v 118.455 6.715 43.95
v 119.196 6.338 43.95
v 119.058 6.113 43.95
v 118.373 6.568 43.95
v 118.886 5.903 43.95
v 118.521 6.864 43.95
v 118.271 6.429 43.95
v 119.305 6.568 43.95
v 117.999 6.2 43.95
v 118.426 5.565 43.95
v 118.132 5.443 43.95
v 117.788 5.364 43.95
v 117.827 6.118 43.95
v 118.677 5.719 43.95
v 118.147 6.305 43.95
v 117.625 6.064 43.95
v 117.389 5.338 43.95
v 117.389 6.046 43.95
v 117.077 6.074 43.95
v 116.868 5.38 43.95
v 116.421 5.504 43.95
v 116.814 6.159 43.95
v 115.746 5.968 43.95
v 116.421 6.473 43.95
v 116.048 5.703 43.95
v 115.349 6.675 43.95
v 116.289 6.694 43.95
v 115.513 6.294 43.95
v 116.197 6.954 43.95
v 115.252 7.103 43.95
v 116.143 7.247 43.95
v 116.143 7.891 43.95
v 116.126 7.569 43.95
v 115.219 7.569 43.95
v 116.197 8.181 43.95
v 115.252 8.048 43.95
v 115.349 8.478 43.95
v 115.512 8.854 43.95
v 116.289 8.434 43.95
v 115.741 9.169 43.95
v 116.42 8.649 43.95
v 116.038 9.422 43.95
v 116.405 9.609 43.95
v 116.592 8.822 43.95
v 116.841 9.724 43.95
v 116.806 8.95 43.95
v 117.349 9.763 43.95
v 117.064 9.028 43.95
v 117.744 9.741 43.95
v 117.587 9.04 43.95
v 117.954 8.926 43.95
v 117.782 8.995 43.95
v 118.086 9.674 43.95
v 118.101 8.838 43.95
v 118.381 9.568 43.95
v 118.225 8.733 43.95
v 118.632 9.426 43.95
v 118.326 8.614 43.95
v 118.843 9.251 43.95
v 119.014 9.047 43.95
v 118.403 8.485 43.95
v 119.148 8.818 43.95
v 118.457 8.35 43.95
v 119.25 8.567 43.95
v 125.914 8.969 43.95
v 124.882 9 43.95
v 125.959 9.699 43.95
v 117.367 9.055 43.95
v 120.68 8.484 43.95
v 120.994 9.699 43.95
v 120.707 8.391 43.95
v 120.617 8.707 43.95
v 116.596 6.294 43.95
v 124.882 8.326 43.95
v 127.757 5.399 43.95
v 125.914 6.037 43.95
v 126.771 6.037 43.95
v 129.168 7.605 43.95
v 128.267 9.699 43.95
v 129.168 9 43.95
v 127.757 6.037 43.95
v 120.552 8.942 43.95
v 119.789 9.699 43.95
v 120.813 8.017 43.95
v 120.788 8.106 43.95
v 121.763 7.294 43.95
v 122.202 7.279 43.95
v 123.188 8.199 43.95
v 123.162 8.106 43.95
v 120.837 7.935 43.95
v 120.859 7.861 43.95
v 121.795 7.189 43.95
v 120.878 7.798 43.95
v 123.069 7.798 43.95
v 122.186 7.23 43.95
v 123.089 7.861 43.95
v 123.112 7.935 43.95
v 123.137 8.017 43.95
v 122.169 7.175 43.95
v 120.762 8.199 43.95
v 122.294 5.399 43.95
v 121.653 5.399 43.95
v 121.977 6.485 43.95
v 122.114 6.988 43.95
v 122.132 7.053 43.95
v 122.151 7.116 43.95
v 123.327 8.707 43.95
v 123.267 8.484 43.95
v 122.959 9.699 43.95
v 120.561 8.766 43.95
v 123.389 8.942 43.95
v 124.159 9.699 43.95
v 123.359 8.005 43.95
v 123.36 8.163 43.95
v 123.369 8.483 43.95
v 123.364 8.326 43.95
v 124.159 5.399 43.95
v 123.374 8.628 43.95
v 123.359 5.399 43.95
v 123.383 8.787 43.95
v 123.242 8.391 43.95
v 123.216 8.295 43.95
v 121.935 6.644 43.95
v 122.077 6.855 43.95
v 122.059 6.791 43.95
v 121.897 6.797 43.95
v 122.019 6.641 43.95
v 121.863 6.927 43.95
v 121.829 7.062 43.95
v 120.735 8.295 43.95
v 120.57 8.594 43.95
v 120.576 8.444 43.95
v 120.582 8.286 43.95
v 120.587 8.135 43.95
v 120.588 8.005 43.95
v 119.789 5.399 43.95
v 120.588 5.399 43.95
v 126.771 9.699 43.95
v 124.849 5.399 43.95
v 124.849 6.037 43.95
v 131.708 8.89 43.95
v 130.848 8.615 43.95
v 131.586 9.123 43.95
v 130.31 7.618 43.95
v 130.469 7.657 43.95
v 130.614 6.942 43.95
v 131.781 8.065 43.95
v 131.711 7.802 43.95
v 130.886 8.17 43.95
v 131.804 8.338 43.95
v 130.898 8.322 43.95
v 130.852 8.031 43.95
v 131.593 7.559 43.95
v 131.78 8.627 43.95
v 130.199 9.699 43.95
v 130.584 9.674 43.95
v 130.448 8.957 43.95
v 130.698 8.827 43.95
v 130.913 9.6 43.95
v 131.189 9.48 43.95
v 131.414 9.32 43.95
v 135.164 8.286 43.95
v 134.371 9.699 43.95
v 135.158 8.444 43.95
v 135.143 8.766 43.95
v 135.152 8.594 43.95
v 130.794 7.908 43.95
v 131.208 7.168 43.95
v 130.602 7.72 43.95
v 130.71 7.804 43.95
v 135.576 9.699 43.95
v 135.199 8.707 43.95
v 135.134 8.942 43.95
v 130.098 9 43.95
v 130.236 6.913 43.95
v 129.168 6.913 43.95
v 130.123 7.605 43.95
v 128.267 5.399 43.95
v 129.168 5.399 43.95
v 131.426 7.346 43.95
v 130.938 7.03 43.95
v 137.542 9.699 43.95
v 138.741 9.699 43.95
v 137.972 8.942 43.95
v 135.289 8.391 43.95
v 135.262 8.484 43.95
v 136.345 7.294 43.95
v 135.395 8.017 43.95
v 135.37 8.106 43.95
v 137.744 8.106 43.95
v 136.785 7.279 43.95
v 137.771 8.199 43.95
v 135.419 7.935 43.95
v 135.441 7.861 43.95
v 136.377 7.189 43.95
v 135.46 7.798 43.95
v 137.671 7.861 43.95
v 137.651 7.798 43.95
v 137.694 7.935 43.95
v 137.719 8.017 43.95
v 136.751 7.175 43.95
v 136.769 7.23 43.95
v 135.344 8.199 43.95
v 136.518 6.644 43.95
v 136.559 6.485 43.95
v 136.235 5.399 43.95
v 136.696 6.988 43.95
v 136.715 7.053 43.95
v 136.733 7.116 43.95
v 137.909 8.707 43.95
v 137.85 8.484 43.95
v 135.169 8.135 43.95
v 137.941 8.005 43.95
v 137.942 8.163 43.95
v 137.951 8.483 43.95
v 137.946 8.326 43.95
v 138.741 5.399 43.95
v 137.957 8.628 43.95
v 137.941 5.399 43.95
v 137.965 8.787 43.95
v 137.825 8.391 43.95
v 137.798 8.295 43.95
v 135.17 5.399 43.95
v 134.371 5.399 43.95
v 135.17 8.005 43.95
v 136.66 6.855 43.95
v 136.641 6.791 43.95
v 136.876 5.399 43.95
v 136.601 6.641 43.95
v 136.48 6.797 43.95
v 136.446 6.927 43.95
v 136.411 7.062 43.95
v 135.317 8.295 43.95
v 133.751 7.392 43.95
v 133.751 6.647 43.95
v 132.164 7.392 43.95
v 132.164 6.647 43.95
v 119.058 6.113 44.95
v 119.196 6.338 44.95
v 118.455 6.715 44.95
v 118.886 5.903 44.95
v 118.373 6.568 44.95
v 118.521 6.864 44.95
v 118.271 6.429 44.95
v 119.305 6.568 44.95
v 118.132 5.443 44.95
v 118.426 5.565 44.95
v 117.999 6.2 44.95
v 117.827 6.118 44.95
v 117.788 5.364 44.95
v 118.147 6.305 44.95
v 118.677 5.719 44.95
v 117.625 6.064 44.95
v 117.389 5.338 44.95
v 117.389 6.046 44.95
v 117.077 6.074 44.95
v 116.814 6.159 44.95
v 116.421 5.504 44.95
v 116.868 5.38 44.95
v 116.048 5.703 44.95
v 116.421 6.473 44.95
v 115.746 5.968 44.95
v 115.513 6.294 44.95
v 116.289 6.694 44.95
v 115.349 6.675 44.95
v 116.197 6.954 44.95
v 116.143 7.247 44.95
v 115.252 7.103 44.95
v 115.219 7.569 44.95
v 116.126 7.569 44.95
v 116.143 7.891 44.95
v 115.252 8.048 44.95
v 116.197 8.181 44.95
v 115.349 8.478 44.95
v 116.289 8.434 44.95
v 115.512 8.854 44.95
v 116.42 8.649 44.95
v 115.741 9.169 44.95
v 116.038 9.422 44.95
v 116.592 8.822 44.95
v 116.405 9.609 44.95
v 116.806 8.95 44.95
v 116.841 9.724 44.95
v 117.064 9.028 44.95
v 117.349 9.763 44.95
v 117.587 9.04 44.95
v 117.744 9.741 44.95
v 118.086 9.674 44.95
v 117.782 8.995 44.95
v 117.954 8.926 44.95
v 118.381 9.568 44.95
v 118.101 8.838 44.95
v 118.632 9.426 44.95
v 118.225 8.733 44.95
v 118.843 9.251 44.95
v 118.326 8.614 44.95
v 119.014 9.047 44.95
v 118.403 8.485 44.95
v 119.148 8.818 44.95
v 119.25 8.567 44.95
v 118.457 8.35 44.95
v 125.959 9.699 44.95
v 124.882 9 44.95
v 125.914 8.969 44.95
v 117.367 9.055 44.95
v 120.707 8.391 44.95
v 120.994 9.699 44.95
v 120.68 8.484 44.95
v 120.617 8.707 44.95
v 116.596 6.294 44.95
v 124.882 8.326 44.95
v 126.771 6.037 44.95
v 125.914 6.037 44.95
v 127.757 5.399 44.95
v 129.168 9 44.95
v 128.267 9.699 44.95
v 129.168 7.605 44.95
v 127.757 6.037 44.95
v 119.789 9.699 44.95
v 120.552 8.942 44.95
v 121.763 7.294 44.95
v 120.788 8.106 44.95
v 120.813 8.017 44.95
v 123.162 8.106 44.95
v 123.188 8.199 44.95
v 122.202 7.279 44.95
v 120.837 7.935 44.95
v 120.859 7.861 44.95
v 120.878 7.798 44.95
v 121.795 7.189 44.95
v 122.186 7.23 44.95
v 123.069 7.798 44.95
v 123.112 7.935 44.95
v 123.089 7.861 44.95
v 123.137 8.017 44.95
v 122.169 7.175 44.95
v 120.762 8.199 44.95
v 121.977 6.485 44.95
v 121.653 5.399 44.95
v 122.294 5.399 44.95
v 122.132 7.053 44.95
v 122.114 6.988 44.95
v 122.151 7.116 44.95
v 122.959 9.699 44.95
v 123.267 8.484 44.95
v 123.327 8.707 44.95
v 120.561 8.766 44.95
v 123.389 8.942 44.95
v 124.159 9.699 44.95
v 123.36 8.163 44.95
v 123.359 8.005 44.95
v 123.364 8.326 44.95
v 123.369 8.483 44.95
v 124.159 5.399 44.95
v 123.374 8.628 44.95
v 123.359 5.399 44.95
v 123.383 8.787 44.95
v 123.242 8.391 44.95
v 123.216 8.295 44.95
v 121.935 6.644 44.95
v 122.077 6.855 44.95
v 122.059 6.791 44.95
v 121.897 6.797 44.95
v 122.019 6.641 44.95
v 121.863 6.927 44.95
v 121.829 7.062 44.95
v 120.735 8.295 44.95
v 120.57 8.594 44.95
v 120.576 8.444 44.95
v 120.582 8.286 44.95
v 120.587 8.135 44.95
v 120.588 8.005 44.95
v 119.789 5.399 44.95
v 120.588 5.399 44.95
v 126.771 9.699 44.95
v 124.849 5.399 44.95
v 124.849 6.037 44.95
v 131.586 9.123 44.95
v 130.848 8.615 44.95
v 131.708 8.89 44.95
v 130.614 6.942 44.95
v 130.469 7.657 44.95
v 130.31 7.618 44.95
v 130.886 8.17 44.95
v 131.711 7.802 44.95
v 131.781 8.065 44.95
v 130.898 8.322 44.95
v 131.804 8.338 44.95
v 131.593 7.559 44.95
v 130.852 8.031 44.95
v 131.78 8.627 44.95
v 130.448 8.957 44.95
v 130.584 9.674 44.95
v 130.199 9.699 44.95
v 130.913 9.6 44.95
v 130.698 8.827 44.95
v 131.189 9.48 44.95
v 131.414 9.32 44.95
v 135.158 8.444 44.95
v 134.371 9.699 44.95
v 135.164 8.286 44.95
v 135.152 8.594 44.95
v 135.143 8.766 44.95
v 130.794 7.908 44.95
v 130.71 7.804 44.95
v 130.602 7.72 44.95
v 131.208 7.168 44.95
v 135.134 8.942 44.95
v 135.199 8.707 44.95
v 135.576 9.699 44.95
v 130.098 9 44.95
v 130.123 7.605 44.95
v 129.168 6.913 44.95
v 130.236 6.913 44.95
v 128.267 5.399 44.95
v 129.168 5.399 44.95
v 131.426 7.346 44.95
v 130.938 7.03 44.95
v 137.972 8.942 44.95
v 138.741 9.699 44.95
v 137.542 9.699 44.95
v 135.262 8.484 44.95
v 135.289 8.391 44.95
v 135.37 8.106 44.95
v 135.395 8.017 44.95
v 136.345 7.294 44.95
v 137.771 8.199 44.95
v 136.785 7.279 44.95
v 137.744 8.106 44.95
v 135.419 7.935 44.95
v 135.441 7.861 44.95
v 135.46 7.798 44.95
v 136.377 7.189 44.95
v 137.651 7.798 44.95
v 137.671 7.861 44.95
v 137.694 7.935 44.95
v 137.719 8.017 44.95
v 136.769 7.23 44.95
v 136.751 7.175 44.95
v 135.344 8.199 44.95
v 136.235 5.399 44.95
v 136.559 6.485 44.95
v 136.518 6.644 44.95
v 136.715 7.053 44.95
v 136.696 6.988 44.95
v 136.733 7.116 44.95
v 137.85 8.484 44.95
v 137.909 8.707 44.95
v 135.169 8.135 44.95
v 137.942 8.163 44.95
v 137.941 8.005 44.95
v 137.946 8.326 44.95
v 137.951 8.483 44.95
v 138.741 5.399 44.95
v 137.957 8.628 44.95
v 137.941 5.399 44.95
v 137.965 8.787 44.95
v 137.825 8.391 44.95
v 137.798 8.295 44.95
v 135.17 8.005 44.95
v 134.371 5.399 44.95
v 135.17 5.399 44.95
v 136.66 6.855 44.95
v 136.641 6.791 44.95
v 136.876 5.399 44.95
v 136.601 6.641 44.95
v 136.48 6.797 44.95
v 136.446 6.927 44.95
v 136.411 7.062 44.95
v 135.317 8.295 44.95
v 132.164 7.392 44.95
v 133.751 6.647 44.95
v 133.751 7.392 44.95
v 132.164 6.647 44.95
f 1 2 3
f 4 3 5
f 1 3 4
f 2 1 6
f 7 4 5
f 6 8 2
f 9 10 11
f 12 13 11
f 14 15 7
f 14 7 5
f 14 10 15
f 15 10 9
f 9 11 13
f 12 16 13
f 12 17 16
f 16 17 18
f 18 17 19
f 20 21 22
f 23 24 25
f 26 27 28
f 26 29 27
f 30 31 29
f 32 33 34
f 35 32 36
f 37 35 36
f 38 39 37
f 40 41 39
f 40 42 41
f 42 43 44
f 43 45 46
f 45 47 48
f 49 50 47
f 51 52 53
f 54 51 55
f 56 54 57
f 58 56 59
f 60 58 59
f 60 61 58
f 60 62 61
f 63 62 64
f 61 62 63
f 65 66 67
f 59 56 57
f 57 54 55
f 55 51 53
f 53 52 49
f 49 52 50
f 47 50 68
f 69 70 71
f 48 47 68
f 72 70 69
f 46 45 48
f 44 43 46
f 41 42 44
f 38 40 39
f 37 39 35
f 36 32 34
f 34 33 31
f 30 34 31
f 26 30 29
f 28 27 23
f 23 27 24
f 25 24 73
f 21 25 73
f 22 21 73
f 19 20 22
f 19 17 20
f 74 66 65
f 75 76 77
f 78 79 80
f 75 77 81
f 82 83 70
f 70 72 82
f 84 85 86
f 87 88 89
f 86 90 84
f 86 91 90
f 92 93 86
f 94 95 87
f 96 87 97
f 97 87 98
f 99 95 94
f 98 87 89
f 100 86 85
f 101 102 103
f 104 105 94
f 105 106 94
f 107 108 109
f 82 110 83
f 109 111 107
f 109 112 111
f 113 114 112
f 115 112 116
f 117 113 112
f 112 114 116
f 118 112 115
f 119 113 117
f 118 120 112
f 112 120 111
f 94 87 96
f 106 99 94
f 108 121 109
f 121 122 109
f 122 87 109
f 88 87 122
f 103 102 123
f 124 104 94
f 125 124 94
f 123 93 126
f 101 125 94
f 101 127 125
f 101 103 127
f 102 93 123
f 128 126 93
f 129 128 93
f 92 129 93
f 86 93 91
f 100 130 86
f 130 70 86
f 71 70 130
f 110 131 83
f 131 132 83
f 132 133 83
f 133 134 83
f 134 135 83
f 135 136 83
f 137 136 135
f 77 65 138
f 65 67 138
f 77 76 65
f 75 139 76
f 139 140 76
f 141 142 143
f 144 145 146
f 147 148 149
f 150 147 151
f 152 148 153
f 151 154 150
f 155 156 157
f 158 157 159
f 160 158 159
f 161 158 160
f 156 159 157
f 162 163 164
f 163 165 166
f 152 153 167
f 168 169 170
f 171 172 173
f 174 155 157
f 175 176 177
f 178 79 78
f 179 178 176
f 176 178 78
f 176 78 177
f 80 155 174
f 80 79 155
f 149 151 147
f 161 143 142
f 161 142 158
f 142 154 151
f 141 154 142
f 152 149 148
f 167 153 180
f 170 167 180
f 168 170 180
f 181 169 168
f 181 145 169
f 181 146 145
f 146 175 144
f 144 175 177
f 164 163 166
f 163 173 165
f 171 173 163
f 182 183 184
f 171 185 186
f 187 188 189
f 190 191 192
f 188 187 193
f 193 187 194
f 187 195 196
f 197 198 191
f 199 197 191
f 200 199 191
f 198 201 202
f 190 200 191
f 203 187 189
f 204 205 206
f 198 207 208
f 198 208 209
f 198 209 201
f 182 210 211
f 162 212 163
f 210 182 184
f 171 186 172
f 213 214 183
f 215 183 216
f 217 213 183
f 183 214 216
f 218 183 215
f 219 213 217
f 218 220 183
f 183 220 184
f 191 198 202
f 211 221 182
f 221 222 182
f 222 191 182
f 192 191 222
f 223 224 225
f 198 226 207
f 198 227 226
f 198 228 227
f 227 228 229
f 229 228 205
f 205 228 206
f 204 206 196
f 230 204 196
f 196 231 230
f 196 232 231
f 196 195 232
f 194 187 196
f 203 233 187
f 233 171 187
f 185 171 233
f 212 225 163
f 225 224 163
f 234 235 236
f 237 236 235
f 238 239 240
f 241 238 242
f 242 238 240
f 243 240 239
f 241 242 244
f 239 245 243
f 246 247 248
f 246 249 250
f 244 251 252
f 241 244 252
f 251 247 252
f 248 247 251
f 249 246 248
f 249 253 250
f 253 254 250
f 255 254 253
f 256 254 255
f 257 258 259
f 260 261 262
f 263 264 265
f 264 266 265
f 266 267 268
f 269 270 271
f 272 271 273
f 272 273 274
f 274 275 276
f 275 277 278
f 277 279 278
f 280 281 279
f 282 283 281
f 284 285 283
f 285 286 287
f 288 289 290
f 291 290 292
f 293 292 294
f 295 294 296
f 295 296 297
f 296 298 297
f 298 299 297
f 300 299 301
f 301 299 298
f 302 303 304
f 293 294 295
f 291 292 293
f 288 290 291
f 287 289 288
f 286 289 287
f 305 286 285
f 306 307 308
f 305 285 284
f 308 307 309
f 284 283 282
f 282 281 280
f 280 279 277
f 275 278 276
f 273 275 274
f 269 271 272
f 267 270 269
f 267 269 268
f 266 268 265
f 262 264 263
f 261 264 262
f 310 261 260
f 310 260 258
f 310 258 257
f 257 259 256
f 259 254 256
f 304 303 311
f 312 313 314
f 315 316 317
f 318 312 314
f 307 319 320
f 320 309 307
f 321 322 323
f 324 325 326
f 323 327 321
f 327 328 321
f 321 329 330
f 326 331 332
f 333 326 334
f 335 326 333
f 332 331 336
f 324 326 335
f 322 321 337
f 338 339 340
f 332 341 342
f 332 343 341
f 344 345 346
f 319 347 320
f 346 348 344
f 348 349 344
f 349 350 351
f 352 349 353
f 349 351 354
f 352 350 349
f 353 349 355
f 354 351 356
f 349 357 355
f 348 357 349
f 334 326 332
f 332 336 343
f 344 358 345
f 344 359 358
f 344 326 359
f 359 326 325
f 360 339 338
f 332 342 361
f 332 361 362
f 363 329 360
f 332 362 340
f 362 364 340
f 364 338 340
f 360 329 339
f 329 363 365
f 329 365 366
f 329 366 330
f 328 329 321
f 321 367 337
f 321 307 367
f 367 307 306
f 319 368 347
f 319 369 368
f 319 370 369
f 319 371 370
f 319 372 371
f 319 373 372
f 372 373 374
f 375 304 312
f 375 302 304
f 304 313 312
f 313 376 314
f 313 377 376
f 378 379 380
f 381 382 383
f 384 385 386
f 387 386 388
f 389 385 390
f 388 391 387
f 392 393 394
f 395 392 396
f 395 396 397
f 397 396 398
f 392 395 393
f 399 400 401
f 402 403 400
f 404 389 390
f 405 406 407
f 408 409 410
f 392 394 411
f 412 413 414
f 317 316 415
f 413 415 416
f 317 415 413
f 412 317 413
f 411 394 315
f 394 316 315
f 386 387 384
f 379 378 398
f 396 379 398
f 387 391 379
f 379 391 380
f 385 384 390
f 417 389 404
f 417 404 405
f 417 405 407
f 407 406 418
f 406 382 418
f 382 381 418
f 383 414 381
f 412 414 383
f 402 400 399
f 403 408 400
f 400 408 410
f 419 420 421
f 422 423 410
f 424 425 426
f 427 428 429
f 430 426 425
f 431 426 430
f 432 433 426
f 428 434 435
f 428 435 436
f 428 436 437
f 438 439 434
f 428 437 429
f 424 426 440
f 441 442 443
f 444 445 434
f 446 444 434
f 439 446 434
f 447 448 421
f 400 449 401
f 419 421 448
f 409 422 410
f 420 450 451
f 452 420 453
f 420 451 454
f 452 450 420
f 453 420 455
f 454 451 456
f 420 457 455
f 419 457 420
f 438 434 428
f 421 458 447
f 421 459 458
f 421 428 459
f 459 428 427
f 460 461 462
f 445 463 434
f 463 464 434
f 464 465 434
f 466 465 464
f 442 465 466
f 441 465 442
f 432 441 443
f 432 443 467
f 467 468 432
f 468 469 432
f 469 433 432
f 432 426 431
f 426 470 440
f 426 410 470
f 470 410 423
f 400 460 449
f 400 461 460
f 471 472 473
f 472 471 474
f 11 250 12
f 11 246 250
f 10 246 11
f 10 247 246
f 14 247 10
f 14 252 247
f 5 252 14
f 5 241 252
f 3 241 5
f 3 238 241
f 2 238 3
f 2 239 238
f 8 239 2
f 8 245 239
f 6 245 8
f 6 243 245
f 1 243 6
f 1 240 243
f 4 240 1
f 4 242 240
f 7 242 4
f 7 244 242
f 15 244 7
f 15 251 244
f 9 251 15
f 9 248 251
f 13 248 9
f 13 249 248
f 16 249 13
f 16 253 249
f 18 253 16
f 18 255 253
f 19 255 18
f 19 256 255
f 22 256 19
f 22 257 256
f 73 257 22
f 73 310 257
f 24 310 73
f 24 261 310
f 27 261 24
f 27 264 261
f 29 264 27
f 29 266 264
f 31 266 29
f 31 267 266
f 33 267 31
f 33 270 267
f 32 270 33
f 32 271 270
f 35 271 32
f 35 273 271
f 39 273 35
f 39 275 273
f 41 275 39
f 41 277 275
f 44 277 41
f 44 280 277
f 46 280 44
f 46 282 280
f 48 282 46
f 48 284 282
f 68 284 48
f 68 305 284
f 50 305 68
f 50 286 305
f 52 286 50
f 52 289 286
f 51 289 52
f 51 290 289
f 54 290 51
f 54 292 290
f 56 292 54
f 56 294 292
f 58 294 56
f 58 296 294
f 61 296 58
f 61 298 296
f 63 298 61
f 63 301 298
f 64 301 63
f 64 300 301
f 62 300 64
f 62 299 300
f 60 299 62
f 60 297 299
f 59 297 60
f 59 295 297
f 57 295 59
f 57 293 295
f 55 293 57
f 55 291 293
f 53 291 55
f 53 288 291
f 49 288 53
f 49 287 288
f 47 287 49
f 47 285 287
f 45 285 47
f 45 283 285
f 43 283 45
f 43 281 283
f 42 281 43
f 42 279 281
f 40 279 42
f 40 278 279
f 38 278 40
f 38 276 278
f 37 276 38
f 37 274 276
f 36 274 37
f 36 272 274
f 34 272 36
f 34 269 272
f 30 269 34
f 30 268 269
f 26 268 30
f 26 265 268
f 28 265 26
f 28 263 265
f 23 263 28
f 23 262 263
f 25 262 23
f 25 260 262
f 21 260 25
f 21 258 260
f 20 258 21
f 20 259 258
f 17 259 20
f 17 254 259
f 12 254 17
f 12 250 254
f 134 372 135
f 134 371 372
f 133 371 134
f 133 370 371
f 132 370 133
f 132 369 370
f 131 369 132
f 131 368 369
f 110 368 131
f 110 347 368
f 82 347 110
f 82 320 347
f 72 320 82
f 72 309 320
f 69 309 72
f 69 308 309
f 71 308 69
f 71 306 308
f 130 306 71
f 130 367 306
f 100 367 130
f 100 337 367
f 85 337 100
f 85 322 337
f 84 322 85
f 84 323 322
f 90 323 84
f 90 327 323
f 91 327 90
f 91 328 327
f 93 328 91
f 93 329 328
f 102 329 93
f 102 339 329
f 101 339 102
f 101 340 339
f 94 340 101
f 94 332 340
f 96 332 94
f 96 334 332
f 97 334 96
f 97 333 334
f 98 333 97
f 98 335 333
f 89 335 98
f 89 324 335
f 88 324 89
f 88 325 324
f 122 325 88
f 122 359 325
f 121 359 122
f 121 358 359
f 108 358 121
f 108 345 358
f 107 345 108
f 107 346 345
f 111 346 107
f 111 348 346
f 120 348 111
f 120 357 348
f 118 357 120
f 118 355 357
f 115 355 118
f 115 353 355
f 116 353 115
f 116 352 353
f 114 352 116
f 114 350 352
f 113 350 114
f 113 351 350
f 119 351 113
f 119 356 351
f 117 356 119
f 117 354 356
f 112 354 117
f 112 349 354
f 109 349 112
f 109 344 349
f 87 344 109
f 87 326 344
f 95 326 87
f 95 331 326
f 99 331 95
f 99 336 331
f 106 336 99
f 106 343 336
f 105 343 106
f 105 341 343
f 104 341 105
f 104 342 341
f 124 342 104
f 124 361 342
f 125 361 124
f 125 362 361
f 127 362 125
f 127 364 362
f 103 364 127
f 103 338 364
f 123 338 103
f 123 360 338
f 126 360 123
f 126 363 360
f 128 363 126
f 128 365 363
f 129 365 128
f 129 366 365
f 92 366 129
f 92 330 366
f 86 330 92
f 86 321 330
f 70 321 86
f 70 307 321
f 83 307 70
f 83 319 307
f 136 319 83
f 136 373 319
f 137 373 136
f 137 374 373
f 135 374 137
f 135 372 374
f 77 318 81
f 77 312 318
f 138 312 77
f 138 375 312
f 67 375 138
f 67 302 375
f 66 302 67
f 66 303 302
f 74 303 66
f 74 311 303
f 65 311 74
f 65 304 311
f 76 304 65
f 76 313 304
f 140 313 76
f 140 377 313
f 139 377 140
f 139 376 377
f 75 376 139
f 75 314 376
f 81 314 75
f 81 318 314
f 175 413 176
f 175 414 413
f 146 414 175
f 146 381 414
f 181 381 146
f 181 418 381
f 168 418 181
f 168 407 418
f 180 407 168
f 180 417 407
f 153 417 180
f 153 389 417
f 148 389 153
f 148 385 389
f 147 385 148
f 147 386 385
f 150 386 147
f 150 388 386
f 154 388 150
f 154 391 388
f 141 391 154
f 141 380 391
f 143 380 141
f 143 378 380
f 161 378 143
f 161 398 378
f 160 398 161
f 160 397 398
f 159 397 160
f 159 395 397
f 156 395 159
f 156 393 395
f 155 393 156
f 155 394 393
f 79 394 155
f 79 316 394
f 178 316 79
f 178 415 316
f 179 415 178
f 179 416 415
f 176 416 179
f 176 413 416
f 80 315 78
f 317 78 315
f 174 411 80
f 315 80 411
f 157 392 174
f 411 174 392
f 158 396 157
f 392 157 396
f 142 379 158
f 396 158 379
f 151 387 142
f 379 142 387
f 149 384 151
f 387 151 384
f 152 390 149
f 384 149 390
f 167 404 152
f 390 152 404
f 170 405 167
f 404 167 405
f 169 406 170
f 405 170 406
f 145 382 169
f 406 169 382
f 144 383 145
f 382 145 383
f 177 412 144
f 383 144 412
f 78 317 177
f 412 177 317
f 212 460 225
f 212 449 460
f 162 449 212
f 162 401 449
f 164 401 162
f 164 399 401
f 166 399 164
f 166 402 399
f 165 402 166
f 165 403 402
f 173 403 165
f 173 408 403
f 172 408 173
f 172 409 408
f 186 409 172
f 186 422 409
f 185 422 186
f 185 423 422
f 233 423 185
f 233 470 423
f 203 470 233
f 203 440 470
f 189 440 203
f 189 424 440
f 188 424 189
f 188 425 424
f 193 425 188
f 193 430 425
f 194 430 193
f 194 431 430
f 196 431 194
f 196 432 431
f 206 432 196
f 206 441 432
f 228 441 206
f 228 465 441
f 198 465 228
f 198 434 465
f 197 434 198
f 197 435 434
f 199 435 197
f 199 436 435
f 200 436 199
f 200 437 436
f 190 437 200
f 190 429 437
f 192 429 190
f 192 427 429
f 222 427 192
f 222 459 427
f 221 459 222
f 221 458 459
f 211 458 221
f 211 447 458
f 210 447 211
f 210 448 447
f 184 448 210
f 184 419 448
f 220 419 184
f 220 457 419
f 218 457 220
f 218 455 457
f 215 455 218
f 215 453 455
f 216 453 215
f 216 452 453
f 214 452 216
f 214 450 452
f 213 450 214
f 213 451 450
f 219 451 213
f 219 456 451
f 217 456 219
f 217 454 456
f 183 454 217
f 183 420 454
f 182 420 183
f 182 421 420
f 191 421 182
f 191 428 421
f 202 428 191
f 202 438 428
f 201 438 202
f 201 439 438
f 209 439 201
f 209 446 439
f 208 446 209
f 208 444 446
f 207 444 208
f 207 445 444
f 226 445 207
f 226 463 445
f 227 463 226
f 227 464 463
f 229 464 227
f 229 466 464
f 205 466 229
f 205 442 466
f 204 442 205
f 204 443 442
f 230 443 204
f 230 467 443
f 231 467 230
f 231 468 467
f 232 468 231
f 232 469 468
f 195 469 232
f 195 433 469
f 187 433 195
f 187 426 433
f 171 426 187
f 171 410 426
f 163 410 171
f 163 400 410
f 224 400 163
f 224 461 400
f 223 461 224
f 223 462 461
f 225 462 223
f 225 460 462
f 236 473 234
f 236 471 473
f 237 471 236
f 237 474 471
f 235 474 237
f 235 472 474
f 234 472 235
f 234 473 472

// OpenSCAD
// CM1P-M ID text, engraved 0.5 into the plate's top face (frame as cm1p_k_freecad.py).
translate([127, 7.5, 43.95]) linear_extrude(1) text("CM1P-M", size = 4.5, font = "Liberation Sans:style=Bold", halign = "center", valign = "center");
